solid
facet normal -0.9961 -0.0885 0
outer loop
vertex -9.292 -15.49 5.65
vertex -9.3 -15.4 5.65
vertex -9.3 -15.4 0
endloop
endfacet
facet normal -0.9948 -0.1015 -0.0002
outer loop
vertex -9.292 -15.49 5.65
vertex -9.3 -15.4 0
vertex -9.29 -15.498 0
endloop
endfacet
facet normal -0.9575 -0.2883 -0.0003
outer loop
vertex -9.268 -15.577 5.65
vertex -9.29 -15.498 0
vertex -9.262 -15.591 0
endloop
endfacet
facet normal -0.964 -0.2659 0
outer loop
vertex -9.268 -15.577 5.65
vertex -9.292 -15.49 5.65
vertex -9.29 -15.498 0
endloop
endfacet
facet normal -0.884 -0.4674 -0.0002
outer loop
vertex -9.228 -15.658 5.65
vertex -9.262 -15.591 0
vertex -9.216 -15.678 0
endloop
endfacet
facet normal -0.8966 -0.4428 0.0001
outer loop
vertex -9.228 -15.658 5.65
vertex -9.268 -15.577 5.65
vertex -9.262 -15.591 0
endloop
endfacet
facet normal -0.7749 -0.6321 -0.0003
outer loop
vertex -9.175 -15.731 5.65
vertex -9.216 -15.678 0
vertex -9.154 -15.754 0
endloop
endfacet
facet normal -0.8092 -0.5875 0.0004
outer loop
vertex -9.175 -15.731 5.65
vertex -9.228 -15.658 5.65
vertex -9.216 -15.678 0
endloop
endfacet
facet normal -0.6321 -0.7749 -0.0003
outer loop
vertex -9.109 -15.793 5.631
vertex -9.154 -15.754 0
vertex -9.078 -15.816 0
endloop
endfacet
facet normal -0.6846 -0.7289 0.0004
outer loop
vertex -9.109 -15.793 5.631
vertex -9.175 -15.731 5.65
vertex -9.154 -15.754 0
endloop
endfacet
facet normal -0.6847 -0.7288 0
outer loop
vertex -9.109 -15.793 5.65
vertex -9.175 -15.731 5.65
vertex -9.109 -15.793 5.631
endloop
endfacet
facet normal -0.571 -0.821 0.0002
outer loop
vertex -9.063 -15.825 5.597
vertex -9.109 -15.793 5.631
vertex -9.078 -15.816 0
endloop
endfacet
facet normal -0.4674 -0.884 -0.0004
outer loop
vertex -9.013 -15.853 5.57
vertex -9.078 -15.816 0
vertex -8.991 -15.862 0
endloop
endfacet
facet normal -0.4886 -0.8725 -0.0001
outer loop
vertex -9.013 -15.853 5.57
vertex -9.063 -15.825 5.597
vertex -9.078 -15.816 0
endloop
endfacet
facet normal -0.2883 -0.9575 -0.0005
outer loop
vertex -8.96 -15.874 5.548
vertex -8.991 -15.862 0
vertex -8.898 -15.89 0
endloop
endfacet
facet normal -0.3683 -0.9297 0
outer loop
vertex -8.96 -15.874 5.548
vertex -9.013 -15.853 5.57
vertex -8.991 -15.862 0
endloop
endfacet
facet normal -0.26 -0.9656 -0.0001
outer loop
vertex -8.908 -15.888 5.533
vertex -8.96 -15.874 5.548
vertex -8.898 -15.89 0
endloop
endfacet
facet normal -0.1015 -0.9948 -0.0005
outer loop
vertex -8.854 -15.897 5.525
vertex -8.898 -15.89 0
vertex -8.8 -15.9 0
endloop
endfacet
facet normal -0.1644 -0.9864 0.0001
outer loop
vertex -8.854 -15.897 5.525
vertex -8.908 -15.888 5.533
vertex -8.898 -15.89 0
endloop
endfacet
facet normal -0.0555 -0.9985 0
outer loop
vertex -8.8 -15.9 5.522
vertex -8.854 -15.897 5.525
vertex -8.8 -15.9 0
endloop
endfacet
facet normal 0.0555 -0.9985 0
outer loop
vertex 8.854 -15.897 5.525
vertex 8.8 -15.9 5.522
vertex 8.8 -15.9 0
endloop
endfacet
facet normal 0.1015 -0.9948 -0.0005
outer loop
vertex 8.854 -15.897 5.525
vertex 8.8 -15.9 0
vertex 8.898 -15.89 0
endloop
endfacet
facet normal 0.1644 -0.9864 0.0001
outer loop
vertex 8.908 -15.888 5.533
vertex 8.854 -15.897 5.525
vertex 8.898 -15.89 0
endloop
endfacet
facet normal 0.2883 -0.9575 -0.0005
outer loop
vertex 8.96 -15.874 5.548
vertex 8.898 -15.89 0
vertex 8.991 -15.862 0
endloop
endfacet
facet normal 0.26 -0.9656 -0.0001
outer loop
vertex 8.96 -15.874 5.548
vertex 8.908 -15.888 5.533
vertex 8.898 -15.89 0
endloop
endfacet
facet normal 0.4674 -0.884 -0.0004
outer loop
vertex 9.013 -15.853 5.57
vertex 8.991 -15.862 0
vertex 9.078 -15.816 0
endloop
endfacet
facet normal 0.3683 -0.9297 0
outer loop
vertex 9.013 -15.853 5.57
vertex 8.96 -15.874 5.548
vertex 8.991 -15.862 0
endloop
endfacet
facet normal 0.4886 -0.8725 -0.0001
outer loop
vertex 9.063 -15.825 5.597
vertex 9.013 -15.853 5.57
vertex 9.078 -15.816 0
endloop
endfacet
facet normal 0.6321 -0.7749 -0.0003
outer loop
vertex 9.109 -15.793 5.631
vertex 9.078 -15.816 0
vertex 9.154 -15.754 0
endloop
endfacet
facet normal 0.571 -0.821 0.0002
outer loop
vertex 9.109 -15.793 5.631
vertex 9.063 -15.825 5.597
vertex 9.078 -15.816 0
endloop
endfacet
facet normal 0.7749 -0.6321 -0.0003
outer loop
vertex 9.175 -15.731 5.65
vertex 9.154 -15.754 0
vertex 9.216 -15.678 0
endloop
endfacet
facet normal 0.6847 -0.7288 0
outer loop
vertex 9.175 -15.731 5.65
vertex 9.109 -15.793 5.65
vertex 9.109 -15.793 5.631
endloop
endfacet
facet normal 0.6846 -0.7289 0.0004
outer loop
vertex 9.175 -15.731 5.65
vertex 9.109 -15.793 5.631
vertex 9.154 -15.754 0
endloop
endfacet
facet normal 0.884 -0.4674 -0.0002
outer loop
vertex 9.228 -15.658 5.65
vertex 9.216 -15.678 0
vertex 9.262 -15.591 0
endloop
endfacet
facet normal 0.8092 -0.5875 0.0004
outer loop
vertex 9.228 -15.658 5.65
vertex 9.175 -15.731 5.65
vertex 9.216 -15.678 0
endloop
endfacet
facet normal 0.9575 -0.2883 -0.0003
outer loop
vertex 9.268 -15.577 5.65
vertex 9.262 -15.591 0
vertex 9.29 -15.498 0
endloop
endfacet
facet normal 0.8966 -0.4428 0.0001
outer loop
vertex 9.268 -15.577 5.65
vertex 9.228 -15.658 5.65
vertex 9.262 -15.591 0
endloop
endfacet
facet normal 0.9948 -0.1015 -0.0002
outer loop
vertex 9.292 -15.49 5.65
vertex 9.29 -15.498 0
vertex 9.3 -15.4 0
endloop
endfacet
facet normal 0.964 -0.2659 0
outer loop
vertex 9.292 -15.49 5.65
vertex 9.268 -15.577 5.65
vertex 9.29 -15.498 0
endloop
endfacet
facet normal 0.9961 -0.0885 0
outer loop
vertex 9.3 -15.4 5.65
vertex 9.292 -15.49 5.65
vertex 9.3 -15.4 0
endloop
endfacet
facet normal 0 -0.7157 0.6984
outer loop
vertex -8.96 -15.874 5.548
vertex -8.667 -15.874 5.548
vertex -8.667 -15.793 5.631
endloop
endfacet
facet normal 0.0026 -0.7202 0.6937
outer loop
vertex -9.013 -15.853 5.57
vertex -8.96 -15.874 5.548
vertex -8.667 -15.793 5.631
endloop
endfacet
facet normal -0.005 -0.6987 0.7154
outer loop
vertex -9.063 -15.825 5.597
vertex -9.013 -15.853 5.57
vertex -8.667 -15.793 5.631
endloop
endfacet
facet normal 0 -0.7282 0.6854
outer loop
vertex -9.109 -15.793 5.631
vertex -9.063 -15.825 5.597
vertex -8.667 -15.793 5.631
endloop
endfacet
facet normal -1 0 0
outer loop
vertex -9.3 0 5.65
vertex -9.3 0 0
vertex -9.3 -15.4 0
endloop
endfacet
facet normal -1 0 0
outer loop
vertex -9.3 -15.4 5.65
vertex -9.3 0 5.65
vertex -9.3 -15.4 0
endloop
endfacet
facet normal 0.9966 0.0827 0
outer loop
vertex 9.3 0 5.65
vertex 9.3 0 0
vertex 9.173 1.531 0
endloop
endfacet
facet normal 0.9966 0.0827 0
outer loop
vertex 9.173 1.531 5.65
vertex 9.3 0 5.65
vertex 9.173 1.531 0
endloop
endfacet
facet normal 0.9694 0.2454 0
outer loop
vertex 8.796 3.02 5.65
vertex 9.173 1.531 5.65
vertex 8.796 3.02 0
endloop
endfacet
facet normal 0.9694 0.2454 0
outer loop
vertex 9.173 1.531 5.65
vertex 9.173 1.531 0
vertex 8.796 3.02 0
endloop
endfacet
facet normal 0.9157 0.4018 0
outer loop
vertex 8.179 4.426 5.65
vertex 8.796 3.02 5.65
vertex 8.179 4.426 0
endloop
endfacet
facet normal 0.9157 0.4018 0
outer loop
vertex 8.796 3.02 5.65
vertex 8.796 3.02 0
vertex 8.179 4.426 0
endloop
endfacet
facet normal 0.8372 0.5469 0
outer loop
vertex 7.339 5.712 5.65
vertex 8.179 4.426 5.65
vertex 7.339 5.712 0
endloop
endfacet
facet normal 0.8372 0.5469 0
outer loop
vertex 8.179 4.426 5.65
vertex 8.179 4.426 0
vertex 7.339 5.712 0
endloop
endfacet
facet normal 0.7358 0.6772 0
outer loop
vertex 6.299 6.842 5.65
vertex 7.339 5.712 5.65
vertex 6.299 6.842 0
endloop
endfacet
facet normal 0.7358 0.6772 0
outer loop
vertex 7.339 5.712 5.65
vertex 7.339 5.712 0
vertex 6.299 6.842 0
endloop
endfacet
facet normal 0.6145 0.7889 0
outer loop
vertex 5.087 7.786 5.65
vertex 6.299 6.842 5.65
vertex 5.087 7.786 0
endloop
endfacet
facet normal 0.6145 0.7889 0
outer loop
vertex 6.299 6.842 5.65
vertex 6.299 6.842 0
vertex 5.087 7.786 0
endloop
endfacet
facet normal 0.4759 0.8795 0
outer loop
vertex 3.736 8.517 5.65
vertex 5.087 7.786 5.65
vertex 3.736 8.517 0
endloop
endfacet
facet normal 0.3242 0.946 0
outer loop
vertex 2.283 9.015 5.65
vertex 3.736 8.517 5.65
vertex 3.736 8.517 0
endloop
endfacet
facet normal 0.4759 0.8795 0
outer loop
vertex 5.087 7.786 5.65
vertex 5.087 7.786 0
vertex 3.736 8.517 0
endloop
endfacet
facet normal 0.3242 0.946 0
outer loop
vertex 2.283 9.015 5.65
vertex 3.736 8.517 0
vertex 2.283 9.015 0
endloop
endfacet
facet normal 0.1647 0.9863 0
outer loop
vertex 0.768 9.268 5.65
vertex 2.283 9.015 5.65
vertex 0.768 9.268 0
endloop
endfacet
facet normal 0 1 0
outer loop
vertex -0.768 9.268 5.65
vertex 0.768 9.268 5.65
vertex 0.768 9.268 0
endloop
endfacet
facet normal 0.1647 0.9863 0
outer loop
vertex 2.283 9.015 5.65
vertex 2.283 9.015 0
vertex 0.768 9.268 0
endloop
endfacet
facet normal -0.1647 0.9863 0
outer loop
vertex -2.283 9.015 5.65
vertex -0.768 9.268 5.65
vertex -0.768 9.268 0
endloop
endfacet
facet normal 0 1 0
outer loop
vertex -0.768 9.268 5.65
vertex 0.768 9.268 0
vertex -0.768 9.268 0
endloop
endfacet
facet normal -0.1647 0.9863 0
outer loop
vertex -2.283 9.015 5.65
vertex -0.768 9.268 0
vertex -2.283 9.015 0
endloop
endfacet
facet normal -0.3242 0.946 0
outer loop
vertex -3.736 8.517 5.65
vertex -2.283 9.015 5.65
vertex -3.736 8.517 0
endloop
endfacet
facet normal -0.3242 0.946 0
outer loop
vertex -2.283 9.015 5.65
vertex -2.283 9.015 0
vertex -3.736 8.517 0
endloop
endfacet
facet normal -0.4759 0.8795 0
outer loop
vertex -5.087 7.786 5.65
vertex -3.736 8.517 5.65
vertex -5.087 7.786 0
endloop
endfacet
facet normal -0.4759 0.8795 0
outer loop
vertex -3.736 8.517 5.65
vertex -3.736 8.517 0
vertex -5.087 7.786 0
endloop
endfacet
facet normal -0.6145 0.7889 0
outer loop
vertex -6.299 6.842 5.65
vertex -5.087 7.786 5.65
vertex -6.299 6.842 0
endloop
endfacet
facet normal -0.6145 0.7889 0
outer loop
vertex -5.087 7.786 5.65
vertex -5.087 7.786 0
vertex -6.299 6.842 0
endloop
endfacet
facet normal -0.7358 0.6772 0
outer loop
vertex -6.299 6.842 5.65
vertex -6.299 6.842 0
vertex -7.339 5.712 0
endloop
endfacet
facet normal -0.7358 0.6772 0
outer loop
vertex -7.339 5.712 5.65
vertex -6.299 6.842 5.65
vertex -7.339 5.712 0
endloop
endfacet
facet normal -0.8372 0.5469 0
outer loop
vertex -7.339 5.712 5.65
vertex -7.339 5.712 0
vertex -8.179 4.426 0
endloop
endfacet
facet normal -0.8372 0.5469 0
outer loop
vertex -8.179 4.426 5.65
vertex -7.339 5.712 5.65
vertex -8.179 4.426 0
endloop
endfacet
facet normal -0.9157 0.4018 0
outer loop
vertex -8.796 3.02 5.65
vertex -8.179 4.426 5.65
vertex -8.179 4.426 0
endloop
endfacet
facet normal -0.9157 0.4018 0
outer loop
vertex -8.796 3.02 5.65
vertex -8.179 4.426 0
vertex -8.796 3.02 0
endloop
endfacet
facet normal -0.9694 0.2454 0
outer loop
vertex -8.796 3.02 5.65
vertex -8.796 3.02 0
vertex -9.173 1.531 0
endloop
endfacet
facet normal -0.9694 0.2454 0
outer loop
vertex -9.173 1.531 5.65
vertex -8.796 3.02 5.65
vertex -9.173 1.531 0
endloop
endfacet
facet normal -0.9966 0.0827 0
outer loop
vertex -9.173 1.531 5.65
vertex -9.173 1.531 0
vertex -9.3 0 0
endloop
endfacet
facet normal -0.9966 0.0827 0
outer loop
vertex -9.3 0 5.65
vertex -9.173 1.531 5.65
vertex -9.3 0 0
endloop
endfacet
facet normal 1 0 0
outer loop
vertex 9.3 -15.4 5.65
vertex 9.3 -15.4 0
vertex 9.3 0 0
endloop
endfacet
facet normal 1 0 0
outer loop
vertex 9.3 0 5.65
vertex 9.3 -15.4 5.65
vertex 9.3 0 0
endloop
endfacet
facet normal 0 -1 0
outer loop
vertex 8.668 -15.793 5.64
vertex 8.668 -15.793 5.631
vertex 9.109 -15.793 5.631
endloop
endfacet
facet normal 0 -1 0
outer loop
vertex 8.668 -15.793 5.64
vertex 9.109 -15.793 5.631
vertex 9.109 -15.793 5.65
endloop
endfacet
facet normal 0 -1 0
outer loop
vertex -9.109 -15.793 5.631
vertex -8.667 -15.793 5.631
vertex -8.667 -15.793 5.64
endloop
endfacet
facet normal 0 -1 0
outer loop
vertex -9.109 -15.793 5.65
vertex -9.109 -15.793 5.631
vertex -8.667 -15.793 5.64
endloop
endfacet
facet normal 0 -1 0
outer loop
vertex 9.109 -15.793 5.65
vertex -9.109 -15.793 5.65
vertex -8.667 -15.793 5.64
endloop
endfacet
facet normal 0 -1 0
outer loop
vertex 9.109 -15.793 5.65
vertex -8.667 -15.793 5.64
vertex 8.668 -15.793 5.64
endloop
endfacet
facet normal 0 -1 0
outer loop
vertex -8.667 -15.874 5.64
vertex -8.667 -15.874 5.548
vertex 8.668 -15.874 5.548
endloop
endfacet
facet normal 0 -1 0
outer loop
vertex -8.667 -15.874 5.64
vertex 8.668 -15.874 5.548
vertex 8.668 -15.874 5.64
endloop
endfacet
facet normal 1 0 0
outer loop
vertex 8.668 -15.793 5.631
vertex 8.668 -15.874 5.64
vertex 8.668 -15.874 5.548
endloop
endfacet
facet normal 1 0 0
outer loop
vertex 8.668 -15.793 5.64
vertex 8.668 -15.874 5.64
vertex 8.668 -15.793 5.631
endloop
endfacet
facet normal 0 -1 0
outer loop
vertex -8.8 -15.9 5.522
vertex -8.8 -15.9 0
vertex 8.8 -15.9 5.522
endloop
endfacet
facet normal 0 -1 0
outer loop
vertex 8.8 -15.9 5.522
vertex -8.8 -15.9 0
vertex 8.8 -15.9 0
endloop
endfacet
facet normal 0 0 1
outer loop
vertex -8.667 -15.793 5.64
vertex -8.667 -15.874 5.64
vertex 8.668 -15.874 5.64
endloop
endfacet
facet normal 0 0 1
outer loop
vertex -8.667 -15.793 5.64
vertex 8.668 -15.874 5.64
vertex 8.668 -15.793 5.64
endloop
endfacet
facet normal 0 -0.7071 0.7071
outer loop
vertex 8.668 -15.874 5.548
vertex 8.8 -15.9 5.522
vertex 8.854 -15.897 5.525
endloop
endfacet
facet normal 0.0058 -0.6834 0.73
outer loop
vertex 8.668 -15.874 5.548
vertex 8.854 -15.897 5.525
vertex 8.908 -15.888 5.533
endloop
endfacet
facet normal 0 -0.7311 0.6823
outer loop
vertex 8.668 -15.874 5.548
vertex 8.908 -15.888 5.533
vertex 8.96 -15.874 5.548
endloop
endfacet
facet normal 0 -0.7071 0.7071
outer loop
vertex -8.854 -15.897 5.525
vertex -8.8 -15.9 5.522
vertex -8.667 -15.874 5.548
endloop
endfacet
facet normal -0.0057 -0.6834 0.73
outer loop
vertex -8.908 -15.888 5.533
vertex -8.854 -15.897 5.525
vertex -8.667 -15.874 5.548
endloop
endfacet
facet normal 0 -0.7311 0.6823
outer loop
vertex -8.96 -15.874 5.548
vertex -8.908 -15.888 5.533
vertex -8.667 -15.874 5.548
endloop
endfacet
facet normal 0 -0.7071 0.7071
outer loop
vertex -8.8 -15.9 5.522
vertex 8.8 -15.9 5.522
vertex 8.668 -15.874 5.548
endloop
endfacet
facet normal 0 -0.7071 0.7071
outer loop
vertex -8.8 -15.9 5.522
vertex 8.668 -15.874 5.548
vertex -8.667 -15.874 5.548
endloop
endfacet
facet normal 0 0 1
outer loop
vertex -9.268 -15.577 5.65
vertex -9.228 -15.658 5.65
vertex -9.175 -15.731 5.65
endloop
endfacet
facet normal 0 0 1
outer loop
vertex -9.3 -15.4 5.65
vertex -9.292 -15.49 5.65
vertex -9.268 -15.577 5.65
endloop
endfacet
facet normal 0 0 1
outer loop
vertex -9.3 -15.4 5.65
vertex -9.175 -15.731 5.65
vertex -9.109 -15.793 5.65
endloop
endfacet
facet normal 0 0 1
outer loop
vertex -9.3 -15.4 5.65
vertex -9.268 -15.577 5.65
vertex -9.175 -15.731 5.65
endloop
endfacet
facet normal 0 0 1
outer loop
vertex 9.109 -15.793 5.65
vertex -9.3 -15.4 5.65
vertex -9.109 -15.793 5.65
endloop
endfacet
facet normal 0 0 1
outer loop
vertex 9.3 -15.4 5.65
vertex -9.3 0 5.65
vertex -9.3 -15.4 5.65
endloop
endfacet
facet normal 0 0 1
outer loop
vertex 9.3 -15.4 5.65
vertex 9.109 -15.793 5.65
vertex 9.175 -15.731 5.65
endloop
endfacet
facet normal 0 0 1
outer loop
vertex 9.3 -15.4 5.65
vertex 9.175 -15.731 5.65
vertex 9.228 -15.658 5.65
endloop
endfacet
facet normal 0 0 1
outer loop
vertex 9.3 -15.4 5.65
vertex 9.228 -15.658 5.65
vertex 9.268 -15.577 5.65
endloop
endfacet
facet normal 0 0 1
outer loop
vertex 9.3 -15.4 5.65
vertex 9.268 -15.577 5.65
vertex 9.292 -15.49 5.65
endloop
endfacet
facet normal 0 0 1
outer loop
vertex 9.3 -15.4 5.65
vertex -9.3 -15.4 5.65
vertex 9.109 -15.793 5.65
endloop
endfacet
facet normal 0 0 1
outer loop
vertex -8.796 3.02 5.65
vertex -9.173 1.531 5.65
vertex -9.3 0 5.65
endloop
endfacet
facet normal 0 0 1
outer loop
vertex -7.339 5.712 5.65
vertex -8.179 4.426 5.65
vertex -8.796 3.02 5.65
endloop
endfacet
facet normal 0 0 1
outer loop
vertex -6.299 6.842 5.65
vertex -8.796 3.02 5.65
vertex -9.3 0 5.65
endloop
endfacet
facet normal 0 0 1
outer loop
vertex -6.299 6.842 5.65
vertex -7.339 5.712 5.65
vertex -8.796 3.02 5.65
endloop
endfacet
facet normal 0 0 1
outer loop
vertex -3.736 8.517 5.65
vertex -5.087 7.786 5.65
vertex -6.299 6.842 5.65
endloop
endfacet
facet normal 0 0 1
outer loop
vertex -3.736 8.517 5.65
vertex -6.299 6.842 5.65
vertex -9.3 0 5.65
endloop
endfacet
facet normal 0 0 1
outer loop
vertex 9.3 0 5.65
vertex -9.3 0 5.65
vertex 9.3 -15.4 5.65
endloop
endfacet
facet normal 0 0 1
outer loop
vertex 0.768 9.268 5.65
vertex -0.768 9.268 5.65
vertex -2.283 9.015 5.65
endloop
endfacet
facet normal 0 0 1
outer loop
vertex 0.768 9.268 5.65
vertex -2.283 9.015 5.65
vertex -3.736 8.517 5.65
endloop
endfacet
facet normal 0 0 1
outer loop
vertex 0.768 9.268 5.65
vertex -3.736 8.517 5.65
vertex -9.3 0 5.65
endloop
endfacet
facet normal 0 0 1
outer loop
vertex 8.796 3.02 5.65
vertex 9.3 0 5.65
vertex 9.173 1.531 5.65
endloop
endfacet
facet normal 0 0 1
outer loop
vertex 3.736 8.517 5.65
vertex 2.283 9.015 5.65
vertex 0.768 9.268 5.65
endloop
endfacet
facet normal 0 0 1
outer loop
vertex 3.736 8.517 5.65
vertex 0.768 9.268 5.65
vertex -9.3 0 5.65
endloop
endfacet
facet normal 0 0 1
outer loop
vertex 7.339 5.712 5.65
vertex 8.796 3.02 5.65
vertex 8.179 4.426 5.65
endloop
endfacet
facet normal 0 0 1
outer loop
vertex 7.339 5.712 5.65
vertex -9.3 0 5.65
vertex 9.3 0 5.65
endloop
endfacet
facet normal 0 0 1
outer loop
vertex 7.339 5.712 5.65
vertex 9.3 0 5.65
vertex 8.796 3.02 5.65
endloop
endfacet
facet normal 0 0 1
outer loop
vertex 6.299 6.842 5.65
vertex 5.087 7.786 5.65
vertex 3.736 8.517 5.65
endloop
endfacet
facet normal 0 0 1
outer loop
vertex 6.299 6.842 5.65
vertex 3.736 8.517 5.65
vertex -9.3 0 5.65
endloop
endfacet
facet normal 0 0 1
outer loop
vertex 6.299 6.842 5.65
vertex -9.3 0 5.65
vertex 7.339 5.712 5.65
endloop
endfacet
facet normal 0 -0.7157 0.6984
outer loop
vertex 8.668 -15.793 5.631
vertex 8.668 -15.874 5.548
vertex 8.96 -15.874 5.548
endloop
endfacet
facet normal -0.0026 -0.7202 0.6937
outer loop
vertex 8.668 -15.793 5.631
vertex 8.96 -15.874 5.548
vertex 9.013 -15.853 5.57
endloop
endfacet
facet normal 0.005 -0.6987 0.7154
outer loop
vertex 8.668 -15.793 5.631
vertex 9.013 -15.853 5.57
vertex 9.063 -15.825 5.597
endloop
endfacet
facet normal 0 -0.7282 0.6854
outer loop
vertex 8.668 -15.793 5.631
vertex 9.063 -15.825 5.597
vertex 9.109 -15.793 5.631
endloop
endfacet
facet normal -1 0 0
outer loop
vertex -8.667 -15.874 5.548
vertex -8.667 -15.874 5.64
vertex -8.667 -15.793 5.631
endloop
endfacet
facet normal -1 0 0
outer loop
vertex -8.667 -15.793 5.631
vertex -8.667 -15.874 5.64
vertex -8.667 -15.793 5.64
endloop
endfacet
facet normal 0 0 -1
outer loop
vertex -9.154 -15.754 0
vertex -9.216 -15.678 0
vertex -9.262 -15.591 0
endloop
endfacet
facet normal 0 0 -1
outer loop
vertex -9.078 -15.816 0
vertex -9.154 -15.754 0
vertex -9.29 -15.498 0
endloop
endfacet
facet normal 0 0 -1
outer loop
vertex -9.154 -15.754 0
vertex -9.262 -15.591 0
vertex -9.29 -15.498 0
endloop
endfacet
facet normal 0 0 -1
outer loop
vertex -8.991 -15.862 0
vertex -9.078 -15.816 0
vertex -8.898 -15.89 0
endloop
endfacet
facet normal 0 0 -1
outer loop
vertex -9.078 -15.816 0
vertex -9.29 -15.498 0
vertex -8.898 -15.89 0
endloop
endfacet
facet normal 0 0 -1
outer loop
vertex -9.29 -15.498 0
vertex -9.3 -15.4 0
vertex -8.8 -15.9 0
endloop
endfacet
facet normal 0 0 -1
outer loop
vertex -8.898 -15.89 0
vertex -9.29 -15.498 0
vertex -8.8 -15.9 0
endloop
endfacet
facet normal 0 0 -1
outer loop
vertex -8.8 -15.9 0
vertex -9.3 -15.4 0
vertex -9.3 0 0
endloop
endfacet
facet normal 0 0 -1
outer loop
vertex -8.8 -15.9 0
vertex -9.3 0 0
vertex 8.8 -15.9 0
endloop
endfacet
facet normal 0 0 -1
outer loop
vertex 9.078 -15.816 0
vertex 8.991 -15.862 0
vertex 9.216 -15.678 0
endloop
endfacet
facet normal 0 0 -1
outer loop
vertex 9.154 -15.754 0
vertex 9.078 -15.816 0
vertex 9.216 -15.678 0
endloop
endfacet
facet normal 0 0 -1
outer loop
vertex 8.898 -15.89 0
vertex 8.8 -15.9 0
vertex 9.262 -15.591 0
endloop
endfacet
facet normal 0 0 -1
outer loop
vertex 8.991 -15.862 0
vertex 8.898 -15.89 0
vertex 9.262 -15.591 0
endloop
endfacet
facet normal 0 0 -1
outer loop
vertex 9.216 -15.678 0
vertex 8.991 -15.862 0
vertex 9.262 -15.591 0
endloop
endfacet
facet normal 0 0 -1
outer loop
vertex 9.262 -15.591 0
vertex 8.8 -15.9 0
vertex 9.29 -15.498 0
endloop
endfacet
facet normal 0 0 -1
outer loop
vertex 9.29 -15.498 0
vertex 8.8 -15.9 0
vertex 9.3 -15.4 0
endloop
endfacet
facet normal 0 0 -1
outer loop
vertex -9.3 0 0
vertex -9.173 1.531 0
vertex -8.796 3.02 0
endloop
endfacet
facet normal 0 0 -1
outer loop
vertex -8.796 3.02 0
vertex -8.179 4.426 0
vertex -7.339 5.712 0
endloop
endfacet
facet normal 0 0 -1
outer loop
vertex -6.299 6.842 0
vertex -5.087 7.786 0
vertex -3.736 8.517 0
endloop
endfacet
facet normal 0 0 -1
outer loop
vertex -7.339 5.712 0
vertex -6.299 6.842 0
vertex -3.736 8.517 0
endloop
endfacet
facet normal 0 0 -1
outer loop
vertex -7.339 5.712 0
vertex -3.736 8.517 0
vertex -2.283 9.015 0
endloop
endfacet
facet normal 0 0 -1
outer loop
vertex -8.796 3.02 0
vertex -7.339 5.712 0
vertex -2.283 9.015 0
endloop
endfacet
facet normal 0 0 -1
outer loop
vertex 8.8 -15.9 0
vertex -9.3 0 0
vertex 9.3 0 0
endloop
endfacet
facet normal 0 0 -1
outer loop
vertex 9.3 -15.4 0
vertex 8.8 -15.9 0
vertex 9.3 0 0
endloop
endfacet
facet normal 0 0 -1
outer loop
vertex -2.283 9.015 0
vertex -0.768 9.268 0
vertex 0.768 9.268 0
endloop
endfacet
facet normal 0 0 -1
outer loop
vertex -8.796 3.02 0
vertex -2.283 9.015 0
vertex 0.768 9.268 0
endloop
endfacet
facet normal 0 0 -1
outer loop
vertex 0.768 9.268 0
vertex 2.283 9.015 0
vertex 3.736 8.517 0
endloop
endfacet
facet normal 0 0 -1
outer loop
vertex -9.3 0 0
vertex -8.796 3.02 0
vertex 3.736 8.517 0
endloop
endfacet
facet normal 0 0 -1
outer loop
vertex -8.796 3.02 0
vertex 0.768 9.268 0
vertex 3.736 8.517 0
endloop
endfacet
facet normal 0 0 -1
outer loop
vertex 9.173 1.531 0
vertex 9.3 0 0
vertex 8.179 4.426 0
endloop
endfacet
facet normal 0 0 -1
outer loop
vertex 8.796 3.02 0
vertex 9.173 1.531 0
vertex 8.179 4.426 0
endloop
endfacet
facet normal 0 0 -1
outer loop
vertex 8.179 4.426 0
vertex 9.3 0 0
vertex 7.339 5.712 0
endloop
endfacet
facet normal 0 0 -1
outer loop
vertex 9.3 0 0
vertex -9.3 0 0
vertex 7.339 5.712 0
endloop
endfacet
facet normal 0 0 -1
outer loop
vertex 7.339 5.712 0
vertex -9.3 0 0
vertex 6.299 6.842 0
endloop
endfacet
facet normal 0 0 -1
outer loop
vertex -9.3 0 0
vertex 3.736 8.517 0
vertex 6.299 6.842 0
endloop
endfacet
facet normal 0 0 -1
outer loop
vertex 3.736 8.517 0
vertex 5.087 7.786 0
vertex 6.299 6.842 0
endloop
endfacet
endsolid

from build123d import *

# Parameters (mm, degrees)
EXTRUDE_1_DEPTH = 5.65
FILLET_1_R      = 0.5
OTHER_START     = -9.109345257
OTHER_1_DEPTH   = 18.218690514
OTHER_1_2_DEPTH = 0.442344722
OTHER_START_2   = 8.668200897
OTHER_1_3_DEPTH = 0.44114436


# Read off the part's stored shape, not the designer's step: 型腔1
with BuildPart() as part:
    # 草图1 → 凸台-拉伸1 (new body)
    with BuildSketch(Plane.XY):
        with BuildLine():
            Line((-9.3, 0), (-9.3, -15.9))
            Line((-9.3, -15.9), (9.3, -15.9))
            Line((9.3, -15.9), (9.3, 0))
            ThreePointArc((9.3, 0), (0, 9.3), (-9.3, 0))
        make_face()
    extrude(amount=EXTRUDE_1_DEPTH)

    # 圆角1
    fillet_1_edges = [part.edges().sort_by_distance(p)[0] for p in [
        (9.3, -15.9, 2.825),
        (-9.3, -15.9, 2.825),
    ]]
    fillet(fillet_1_edges, radius=FILLET_1_R)

    # 型腔1 outline → 型腔1 (cut)
    with BuildSketch(Plane.YZ.offset(OTHER_START)):
        Polygon((-15.873817403, 5.640486893), (-15.792817403, 5.640486893), (-15.792817403, 5.65), (-15.9, 5.65), (-15.9, 5.521595656), (-15.873817403, 5.54823926), align=None)
    extrude(amount=OTHER_1_DEPTH, mode=Mode.SUBTRACT)

    # Other 1 2 outline → Other 1 2 (cut)
    with BuildSketch(Plane.YZ.offset(OTHER_START)):
        Polygon((-15.873817403, 5.54823926), (-15.792817403, 5.63066546), (-15.792817403, 5.640486893), (-15.873817403, 5.640486893), align=None)
    extrude(amount=OTHER_1_2_DEPTH, mode=Mode.SUBTRACT)

    # Other 1 3 outline → Other 1 3 (cut)
    with BuildSketch(Plane.YZ.offset(OTHER_START_2)):
        Polygon((-15.873817403, 5.54823926), (-15.792817403, 5.63066546), (-15.792817403, 5.640486893), (-15.873817403, 5.640486893), align=None)
    extrude(amount=OTHER_1_3_DEPTH, mode=Mode.SUBTRACT)


solid = part.part
